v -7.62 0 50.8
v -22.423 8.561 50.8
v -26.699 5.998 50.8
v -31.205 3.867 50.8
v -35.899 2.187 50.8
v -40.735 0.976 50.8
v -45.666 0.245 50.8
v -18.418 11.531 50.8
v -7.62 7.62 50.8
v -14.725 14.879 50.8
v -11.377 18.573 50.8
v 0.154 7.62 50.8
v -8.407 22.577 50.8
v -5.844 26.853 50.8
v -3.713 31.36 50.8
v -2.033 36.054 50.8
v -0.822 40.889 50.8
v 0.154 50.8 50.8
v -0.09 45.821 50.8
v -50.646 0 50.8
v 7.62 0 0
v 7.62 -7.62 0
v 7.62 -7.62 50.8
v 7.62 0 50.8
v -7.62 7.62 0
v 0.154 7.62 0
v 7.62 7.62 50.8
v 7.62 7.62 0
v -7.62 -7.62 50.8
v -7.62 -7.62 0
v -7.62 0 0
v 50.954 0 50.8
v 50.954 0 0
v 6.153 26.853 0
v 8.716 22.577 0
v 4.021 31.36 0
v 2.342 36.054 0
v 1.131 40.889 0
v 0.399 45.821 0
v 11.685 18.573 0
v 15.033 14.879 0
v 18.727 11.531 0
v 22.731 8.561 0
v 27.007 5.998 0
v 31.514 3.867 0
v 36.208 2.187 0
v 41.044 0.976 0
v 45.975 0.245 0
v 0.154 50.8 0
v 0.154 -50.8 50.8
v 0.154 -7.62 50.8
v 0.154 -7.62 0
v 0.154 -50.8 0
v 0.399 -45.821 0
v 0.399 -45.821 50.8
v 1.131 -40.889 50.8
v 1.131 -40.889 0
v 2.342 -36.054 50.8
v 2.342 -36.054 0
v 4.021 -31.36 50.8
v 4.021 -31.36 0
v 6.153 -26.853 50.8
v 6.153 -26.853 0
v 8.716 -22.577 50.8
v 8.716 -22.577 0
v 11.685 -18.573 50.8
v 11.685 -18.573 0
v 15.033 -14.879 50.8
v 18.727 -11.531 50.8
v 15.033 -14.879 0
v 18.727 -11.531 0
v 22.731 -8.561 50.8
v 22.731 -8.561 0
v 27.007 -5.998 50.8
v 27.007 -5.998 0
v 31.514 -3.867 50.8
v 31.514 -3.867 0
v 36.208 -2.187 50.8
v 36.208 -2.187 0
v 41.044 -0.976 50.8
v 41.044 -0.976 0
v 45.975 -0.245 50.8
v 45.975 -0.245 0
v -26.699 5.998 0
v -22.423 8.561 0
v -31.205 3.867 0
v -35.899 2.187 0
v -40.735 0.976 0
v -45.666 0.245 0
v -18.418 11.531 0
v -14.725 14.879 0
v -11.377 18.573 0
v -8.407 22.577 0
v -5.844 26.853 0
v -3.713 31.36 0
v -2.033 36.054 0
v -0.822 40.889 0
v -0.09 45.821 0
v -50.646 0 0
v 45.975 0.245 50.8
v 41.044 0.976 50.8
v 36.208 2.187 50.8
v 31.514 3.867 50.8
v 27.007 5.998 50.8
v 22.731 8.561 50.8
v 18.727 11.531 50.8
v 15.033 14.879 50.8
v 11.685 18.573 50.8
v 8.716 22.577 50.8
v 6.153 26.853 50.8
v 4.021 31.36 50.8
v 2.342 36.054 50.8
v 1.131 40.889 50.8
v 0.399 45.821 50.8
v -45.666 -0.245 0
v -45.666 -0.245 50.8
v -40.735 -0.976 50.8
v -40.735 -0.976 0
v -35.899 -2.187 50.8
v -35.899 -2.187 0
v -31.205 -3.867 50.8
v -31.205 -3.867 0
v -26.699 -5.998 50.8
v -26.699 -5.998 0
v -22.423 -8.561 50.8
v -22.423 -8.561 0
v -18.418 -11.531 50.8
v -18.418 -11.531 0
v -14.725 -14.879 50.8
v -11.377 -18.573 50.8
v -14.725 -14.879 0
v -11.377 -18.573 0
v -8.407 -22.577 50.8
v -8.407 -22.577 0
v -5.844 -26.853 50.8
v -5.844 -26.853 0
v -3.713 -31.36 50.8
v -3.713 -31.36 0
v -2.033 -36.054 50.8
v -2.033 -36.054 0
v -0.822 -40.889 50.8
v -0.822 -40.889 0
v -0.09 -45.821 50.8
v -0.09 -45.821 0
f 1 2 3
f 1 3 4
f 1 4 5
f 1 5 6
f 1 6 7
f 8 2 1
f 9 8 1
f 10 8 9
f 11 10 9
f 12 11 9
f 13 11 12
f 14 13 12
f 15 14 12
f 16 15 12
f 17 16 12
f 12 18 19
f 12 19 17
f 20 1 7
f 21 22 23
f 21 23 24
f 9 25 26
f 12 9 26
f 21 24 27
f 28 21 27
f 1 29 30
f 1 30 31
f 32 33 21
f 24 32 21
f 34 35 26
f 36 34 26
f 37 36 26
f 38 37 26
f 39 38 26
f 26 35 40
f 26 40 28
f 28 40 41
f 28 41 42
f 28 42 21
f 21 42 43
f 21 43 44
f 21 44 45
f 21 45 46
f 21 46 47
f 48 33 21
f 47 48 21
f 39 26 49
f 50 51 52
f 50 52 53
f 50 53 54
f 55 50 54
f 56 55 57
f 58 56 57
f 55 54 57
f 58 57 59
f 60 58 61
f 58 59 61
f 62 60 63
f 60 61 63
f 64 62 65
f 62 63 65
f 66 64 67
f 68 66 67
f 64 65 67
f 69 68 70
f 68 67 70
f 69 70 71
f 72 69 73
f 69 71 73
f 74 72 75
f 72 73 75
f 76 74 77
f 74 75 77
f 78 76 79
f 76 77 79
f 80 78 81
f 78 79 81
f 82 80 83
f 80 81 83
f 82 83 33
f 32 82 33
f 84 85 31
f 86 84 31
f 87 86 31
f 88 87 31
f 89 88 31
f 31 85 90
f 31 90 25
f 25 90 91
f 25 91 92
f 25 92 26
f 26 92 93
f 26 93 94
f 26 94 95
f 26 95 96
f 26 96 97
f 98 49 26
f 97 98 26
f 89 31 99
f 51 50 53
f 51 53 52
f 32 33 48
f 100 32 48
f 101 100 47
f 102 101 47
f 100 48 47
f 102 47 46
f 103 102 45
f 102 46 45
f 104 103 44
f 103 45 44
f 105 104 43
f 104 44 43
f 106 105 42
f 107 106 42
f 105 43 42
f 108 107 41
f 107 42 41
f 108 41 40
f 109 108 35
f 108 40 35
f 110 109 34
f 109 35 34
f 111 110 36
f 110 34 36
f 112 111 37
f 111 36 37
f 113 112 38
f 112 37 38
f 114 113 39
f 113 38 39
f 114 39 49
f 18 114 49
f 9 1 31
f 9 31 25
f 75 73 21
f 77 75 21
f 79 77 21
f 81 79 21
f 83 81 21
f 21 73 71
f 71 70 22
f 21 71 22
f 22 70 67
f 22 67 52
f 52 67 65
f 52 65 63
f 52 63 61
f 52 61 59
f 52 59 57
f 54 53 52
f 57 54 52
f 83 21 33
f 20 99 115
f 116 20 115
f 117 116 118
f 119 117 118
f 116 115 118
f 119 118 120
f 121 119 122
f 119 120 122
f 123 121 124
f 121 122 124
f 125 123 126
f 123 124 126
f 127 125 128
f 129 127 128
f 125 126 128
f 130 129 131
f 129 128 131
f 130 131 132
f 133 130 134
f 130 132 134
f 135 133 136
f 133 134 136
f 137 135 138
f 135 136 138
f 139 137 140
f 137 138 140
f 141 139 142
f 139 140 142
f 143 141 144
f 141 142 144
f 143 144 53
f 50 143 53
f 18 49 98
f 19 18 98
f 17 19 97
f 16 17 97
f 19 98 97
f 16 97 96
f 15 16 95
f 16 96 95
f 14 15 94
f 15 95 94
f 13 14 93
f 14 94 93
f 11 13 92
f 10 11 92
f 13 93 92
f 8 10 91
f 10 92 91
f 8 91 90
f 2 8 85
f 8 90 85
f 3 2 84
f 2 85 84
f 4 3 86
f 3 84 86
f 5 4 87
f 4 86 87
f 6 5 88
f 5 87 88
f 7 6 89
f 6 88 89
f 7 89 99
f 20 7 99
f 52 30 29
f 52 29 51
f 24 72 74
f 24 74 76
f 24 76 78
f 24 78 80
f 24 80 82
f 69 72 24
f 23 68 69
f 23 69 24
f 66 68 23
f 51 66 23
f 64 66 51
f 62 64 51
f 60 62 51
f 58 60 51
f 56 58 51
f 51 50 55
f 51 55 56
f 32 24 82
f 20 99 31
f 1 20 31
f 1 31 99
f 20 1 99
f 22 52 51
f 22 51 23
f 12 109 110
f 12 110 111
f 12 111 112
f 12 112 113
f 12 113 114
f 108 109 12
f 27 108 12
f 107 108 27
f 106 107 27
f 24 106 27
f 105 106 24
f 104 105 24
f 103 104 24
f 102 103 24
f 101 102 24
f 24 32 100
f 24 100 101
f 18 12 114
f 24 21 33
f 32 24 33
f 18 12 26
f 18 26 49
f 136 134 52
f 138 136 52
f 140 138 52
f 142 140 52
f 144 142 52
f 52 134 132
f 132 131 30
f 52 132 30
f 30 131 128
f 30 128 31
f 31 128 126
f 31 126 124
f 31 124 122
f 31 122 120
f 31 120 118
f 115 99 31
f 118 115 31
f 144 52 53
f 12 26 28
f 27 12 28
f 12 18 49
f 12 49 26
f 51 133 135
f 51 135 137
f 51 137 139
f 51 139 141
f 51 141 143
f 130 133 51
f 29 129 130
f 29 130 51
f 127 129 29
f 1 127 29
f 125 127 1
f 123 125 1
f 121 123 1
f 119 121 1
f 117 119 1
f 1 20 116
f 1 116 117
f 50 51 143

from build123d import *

# Parameters (mm, degrees)
F2_DEPTH = 50.8
F3_COUNT = 4
F1_W     = 15.24
F1_H     = 15.24
F4_DEPTH = 50.801


with BuildPart() as f2:
    # F0 (on Top) → F2 (new body)
    with BuildSketch(Plane.XY):
        with BuildLine():
            ThreePointArc((0.154402, 50.8), (-14.724573, 14.878976), (-50.645598, 0))
            Line((-50.645598, 0), (0.154402, 0))
            Line((0.154402, 0), (0.154402, 50.8))
        make_face()
    extrude(amount=F2_DEPTH)


with BuildPart() as f3_1:
    # F3: instance of F2
    add(f2.part.rotate(Axis((0.154402, 0, 25.4), (0, 0, 1)), 1 * 360 / F3_COUNT))


with BuildPart() as f3_2:
    # F3: instance of F2
    add(f2.part.rotate(Axis((0.154402, 0, 25.4), (0, 0, 1)), 2 * 360 / F3_COUNT))


with BuildPart() as f3_3:
    # F3: instance of F2
    add(f2.part.rotate(Axis((0.154402, 0, 25.4), (0, 0, 1)), 3 * 360 / F3_COUNT))


with BuildPart() as f4_tool:
    # F1 (on Top) → F4 (new body, through all)
    with BuildSketch(Plane.XY):
        Rectangle(F1_W, F1_H)
    extrude(amount=F4_DEPTH)


with BuildPart() as f2_1:
    add(f2.part)

    # F4: cut by f4_tool
    add(f4_tool.part, mode=Mode.SUBTRACT)


with BuildPart() as f3_1_1:
    add(f3_1.part)

    # F4: cut by f4_tool
    add(f4_tool.part, mode=Mode.SUBTRACT)


with BuildPart() as f3_2_1:
    add(f3_2.part)

    # F4: cut by f4_tool
    add(f4_tool.part, mode=Mode.SUBTRACT)


with BuildPart() as f3_3_1:
    add(f3_3.part)

    # F4: cut by f4_tool
    add(f4_tool.part, mode=Mode.SUBTRACT)


solid = Compound([f2_1.part, f3_1_1.part, f3_2_1.part, f3_3_1.part])
